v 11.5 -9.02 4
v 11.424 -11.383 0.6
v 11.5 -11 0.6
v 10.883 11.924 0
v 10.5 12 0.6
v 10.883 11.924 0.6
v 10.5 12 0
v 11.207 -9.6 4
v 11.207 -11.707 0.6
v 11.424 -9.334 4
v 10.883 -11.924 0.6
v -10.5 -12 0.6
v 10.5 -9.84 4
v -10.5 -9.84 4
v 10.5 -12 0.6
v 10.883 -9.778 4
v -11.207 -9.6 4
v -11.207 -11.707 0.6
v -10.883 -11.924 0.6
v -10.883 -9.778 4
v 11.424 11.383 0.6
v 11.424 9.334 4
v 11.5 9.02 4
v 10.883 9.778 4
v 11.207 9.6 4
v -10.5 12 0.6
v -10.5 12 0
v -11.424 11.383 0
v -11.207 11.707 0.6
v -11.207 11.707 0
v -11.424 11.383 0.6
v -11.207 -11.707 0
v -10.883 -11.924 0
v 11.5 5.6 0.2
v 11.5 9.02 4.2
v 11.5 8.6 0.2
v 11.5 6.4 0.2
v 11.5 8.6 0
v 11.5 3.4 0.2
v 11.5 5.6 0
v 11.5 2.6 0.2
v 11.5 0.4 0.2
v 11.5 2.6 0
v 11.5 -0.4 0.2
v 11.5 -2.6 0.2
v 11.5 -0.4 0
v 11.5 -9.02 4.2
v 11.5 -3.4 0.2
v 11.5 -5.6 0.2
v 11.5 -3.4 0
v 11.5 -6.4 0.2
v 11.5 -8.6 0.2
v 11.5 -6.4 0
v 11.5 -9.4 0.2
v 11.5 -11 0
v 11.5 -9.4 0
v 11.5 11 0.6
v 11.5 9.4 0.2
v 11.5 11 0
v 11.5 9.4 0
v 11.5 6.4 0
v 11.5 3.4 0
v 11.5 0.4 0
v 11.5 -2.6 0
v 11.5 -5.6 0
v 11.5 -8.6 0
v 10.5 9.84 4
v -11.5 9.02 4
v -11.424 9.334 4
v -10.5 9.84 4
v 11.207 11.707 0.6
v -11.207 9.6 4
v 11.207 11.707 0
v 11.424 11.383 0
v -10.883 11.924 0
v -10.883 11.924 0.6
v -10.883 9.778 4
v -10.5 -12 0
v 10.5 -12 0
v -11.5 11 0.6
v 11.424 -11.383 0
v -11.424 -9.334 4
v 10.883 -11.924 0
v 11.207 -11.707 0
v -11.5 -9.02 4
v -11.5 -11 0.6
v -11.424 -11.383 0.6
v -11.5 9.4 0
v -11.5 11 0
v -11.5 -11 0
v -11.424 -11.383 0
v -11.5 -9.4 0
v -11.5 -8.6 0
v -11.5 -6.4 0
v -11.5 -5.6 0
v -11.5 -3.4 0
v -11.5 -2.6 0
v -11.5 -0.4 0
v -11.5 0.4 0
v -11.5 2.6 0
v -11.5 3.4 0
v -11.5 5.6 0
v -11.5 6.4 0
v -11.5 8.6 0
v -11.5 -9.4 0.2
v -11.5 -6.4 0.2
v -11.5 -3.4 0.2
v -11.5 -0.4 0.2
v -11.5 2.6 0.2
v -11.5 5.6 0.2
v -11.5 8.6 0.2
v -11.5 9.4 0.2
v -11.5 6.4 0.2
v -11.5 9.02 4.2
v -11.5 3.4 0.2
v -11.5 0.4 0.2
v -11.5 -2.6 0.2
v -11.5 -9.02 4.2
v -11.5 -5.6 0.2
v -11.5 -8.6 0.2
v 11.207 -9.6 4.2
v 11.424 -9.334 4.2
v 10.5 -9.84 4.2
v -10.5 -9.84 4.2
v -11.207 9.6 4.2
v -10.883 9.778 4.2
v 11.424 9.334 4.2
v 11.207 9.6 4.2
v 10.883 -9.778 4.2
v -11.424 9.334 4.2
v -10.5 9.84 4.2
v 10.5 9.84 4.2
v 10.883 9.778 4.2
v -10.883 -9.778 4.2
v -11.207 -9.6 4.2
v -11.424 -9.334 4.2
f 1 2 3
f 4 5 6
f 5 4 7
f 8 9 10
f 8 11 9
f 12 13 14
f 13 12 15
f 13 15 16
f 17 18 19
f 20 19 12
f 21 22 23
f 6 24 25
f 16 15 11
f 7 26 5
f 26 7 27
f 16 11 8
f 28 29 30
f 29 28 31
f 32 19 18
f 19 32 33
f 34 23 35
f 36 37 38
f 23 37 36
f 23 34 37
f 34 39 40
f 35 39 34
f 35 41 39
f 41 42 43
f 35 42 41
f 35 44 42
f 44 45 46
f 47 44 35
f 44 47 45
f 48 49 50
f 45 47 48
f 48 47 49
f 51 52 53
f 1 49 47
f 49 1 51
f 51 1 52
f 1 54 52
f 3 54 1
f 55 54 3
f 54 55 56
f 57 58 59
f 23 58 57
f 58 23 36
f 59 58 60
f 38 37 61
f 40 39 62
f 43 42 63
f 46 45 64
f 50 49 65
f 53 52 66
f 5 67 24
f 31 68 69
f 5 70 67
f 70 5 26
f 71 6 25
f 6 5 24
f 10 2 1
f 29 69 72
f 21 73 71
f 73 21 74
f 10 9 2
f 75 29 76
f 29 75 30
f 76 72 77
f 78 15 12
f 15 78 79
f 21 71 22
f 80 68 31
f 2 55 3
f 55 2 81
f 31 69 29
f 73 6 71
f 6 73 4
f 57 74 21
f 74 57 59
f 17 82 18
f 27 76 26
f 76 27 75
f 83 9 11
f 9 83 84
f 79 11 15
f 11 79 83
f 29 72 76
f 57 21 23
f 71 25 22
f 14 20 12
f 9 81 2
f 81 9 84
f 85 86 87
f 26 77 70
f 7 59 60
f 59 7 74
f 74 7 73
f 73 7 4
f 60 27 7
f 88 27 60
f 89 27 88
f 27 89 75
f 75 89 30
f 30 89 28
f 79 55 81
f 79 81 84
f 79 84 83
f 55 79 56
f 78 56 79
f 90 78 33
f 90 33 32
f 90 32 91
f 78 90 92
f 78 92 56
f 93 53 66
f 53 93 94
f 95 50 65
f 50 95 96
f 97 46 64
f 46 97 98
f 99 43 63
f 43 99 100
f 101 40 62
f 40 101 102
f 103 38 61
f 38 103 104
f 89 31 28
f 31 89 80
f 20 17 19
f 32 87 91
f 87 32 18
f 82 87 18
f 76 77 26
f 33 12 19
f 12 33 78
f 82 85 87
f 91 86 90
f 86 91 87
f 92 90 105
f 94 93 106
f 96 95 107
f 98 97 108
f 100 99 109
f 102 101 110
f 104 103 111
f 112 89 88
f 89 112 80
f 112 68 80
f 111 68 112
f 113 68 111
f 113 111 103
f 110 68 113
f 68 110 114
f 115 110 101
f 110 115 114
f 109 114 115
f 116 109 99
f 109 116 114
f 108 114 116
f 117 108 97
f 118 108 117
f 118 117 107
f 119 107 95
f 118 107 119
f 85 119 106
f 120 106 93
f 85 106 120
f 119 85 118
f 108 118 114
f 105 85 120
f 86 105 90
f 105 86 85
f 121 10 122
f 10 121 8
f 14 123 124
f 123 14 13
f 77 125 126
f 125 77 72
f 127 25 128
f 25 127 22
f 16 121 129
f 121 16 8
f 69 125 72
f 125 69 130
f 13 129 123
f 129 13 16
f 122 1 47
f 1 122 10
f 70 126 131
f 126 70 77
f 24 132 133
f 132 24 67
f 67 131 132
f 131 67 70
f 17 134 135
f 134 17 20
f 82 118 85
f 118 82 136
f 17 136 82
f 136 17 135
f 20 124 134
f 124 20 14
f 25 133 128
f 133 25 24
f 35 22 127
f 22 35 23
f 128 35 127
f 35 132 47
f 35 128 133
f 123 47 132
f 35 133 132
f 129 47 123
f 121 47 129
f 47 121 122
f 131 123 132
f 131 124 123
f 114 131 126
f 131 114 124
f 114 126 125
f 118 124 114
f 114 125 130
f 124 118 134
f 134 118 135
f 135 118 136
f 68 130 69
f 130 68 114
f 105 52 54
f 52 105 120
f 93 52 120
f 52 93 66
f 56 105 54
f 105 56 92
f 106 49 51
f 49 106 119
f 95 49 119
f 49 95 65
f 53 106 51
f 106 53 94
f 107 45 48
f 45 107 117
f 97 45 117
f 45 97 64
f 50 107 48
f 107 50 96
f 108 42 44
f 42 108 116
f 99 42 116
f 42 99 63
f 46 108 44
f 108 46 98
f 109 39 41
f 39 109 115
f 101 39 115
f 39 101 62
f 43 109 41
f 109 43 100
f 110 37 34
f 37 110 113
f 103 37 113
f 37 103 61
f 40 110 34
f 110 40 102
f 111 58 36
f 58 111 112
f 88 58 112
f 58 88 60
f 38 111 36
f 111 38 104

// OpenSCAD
module octagon(d) {
  intersection_for(a = [0, 45])
  rotate([0, 0, a])
  square(d, center=true);
}

module hexagon(d) {
  circle(d=d*2/sqrt(3), $fn=6);
}

module rail_cavity() {
  reps = 10;
  length = reps * 10 + 5;
  plateau_thickness = 3.6;
  base_height = 3; 
  base_width = 12.8;
  
  // Base.
  translate([-base_width/2, 0, -0.001])
  linear_extrude(base_height + 0.002)
  square([base_width, length]);

  difference() {
    // Plateaus.
    translate([0, 0, base_height + plateau_thickness/2 - 0.2])
    rotate([-90, 0, 0])
    linear_extrude(length)
    hull()
    for (a = [-1, 1])
    translate([a * (18.9 - plateau_thickness) / 2, 0])
    octagon(plateau_thickness);
    
    // Valleys.
    for (a = [0:reps-1])
    translate([-15, 5 + 10*a])
    linear_extrude(15)
    square([30, 5]);
  }
  
  // Fillets at bottom of each valley.
  for (a = [0:reps*2-1])
  translate([0, 5+5*a, base_height])
  rotate([0, 90])
  rotate([0, 0, 45])
  cube([0.7, 0.7, base_width], center=true);
}

module screw_hole(length) {
  $fn = 20;
  
  // Shaft.
  linear_extrude(length)
  octagon(4.3);
  
  // Head.
  translate([0, 0, -3])
  linear_extrude(3.001)
  octagon(7.9);
  
  // Nut.
  translate([0, 0, length-0.001])
  rotate([0, 0, 30])
  linear_extrude(10)
  hexagon(8.9);
}

block_width = 27;
block_height = 15.3;

module block() {
  $fn = 16;
  width = 32;
  roundoff = 1.4;
  
  difference() {
    hull()
    for (a = [-1, 1], b = [0, 1], c = [0, 1])
    translate([
      a*(width/2-roundoff),
      5+roundoff+b*(55-2*roundoff),
      roundoff+c*30
    ])
    sphere(r=roundoff, $fn=20);
    
    translate([0, 0, block_height])
    linear_extrude(30)
    square(200, center=true);

    rail_cavity();

    for (y = [13.5, 54])
    translate([0, y])
    rotate([0, 0, 180])
    translate([2-width/2, 0, 9.8])
    rotate([0, 90, 0])
    screw_hole(width - 6.6);
  }
}

module cookie_cutter(complement=false) {
  tooth_depth = 2.5;
  tooth_width = 10;
  roundoff = 0.3;
  slack = 0.1;
  x_offset = 3;
  
  translate([0, -10])
  linear_extrude(30)
  offset(r=roundoff, $fn=16)
  offset(delta=-roundoff-slack)
  rotate([0, 0, complement ? 180 : 0])
  translate([x_offset * (complement ? 1 : -1), 0])
  difference() {
    translate([0.001-tooth_depth/2, -80])
    square([30, 160]);
    
    for (a = [-10:10])
    if ((a % 2 == 0 && a != 4) || a == -5)
    translate([-tooth_depth/2, a*tooth_width])
    square([tooth_depth, tooth_width]);
  }
}

dovetail_width = 23;
dovetail_length = 24;
dovetail_depth = 4;
dovetail_height = dovetail_depth + 0.2;

module dovetail_2d(retract) {
  $fn = 16;
  
  offset(r=retract?1:0)
  offset(delta=retract?-1:0)
  square([dovetail_width, dovetail_length], center=true);
}

module dovetail(retract=true) {
  scal = 0.82;
  
  difference() {
    union() {
      intersection() {
        // Scale 0.85
        hull() {
          linear_extrude(0.6)
          dovetail_2d(retract);
          
          translate([0, 0, dovetail_depth])
          linear_extrude(1e-6)
          scale([1, scal])
          dovetail_2d(retract);
        }
      }

      linear_extrude(dovetail_height)
      scale([1, scal])
      dovetail_2d(retract);
    }
    
    if (retract)
    for (a = [-3:3])
    translate([0, a*3])
    cube([40, 0.8, 0.4], center=true);
  }
}

module block_piece(complement=false) {
  intersection() {
    difference() {
      block();
      
      // Dovetail slot for the accessory to be glued in.
      for (x = 0.18*[-1, 1], y = 0.2*[-1, 1])
      translate([x, 35+y, block_height-dovetail_depth])
      dovetail(false);
    }
    cookie_cutter(complement);
  }
}

module print_block_pieces() {
  block_piece();
  
  translate([-4, 0])
  block_piece(true);
}

module tombstone_2d(width, height) {
  translate([0, height-width/2])
  difference() {
    circle(d=width);

    translate([0, -50])
    square(100, center=true);
  }
  
  translate([-width/2, 0])
  square([width, height-width/2 + 0.001]);
}

hood_height = 24;
hood_length = 11;
crosshair_elevation = 12;
crosshair_width = 0.7;

module hood_2d() {
  $fn = 40;
  
  wall = 1.5;
  
  difference() {
    tombstone_2d(dovetail_width, hood_height);
    
    translate([0, -wall])
    tombstone_2d(dovetail_width-2*wall, hood_height);
  }
}

module sight() {
  dovetail();

  translate([0, dovetail_length/2, dovetail_height])
  rotate([90, 0]) {
    linear_extrude(hood_length)
    hood_2d();
    
    // Slopes.
    intersection() {
      translate([0, 0, hood_length])
      linear_extrude(30)
      hood_2d();

      translate([0, -49, 0])
      rotate([40, 0])
      cube(100, center=true);
    }
    
    // Crosshairs.
    linear_extrude(5) {
      translate([0, crosshair_elevation])
      square([dovetail_width, crosshair_width], center=true);
        
      translate([-crosshair_width/2, 0])
      square([crosshair_width, crosshair_elevation]);
    }
  }
}

render()
dovetail();
